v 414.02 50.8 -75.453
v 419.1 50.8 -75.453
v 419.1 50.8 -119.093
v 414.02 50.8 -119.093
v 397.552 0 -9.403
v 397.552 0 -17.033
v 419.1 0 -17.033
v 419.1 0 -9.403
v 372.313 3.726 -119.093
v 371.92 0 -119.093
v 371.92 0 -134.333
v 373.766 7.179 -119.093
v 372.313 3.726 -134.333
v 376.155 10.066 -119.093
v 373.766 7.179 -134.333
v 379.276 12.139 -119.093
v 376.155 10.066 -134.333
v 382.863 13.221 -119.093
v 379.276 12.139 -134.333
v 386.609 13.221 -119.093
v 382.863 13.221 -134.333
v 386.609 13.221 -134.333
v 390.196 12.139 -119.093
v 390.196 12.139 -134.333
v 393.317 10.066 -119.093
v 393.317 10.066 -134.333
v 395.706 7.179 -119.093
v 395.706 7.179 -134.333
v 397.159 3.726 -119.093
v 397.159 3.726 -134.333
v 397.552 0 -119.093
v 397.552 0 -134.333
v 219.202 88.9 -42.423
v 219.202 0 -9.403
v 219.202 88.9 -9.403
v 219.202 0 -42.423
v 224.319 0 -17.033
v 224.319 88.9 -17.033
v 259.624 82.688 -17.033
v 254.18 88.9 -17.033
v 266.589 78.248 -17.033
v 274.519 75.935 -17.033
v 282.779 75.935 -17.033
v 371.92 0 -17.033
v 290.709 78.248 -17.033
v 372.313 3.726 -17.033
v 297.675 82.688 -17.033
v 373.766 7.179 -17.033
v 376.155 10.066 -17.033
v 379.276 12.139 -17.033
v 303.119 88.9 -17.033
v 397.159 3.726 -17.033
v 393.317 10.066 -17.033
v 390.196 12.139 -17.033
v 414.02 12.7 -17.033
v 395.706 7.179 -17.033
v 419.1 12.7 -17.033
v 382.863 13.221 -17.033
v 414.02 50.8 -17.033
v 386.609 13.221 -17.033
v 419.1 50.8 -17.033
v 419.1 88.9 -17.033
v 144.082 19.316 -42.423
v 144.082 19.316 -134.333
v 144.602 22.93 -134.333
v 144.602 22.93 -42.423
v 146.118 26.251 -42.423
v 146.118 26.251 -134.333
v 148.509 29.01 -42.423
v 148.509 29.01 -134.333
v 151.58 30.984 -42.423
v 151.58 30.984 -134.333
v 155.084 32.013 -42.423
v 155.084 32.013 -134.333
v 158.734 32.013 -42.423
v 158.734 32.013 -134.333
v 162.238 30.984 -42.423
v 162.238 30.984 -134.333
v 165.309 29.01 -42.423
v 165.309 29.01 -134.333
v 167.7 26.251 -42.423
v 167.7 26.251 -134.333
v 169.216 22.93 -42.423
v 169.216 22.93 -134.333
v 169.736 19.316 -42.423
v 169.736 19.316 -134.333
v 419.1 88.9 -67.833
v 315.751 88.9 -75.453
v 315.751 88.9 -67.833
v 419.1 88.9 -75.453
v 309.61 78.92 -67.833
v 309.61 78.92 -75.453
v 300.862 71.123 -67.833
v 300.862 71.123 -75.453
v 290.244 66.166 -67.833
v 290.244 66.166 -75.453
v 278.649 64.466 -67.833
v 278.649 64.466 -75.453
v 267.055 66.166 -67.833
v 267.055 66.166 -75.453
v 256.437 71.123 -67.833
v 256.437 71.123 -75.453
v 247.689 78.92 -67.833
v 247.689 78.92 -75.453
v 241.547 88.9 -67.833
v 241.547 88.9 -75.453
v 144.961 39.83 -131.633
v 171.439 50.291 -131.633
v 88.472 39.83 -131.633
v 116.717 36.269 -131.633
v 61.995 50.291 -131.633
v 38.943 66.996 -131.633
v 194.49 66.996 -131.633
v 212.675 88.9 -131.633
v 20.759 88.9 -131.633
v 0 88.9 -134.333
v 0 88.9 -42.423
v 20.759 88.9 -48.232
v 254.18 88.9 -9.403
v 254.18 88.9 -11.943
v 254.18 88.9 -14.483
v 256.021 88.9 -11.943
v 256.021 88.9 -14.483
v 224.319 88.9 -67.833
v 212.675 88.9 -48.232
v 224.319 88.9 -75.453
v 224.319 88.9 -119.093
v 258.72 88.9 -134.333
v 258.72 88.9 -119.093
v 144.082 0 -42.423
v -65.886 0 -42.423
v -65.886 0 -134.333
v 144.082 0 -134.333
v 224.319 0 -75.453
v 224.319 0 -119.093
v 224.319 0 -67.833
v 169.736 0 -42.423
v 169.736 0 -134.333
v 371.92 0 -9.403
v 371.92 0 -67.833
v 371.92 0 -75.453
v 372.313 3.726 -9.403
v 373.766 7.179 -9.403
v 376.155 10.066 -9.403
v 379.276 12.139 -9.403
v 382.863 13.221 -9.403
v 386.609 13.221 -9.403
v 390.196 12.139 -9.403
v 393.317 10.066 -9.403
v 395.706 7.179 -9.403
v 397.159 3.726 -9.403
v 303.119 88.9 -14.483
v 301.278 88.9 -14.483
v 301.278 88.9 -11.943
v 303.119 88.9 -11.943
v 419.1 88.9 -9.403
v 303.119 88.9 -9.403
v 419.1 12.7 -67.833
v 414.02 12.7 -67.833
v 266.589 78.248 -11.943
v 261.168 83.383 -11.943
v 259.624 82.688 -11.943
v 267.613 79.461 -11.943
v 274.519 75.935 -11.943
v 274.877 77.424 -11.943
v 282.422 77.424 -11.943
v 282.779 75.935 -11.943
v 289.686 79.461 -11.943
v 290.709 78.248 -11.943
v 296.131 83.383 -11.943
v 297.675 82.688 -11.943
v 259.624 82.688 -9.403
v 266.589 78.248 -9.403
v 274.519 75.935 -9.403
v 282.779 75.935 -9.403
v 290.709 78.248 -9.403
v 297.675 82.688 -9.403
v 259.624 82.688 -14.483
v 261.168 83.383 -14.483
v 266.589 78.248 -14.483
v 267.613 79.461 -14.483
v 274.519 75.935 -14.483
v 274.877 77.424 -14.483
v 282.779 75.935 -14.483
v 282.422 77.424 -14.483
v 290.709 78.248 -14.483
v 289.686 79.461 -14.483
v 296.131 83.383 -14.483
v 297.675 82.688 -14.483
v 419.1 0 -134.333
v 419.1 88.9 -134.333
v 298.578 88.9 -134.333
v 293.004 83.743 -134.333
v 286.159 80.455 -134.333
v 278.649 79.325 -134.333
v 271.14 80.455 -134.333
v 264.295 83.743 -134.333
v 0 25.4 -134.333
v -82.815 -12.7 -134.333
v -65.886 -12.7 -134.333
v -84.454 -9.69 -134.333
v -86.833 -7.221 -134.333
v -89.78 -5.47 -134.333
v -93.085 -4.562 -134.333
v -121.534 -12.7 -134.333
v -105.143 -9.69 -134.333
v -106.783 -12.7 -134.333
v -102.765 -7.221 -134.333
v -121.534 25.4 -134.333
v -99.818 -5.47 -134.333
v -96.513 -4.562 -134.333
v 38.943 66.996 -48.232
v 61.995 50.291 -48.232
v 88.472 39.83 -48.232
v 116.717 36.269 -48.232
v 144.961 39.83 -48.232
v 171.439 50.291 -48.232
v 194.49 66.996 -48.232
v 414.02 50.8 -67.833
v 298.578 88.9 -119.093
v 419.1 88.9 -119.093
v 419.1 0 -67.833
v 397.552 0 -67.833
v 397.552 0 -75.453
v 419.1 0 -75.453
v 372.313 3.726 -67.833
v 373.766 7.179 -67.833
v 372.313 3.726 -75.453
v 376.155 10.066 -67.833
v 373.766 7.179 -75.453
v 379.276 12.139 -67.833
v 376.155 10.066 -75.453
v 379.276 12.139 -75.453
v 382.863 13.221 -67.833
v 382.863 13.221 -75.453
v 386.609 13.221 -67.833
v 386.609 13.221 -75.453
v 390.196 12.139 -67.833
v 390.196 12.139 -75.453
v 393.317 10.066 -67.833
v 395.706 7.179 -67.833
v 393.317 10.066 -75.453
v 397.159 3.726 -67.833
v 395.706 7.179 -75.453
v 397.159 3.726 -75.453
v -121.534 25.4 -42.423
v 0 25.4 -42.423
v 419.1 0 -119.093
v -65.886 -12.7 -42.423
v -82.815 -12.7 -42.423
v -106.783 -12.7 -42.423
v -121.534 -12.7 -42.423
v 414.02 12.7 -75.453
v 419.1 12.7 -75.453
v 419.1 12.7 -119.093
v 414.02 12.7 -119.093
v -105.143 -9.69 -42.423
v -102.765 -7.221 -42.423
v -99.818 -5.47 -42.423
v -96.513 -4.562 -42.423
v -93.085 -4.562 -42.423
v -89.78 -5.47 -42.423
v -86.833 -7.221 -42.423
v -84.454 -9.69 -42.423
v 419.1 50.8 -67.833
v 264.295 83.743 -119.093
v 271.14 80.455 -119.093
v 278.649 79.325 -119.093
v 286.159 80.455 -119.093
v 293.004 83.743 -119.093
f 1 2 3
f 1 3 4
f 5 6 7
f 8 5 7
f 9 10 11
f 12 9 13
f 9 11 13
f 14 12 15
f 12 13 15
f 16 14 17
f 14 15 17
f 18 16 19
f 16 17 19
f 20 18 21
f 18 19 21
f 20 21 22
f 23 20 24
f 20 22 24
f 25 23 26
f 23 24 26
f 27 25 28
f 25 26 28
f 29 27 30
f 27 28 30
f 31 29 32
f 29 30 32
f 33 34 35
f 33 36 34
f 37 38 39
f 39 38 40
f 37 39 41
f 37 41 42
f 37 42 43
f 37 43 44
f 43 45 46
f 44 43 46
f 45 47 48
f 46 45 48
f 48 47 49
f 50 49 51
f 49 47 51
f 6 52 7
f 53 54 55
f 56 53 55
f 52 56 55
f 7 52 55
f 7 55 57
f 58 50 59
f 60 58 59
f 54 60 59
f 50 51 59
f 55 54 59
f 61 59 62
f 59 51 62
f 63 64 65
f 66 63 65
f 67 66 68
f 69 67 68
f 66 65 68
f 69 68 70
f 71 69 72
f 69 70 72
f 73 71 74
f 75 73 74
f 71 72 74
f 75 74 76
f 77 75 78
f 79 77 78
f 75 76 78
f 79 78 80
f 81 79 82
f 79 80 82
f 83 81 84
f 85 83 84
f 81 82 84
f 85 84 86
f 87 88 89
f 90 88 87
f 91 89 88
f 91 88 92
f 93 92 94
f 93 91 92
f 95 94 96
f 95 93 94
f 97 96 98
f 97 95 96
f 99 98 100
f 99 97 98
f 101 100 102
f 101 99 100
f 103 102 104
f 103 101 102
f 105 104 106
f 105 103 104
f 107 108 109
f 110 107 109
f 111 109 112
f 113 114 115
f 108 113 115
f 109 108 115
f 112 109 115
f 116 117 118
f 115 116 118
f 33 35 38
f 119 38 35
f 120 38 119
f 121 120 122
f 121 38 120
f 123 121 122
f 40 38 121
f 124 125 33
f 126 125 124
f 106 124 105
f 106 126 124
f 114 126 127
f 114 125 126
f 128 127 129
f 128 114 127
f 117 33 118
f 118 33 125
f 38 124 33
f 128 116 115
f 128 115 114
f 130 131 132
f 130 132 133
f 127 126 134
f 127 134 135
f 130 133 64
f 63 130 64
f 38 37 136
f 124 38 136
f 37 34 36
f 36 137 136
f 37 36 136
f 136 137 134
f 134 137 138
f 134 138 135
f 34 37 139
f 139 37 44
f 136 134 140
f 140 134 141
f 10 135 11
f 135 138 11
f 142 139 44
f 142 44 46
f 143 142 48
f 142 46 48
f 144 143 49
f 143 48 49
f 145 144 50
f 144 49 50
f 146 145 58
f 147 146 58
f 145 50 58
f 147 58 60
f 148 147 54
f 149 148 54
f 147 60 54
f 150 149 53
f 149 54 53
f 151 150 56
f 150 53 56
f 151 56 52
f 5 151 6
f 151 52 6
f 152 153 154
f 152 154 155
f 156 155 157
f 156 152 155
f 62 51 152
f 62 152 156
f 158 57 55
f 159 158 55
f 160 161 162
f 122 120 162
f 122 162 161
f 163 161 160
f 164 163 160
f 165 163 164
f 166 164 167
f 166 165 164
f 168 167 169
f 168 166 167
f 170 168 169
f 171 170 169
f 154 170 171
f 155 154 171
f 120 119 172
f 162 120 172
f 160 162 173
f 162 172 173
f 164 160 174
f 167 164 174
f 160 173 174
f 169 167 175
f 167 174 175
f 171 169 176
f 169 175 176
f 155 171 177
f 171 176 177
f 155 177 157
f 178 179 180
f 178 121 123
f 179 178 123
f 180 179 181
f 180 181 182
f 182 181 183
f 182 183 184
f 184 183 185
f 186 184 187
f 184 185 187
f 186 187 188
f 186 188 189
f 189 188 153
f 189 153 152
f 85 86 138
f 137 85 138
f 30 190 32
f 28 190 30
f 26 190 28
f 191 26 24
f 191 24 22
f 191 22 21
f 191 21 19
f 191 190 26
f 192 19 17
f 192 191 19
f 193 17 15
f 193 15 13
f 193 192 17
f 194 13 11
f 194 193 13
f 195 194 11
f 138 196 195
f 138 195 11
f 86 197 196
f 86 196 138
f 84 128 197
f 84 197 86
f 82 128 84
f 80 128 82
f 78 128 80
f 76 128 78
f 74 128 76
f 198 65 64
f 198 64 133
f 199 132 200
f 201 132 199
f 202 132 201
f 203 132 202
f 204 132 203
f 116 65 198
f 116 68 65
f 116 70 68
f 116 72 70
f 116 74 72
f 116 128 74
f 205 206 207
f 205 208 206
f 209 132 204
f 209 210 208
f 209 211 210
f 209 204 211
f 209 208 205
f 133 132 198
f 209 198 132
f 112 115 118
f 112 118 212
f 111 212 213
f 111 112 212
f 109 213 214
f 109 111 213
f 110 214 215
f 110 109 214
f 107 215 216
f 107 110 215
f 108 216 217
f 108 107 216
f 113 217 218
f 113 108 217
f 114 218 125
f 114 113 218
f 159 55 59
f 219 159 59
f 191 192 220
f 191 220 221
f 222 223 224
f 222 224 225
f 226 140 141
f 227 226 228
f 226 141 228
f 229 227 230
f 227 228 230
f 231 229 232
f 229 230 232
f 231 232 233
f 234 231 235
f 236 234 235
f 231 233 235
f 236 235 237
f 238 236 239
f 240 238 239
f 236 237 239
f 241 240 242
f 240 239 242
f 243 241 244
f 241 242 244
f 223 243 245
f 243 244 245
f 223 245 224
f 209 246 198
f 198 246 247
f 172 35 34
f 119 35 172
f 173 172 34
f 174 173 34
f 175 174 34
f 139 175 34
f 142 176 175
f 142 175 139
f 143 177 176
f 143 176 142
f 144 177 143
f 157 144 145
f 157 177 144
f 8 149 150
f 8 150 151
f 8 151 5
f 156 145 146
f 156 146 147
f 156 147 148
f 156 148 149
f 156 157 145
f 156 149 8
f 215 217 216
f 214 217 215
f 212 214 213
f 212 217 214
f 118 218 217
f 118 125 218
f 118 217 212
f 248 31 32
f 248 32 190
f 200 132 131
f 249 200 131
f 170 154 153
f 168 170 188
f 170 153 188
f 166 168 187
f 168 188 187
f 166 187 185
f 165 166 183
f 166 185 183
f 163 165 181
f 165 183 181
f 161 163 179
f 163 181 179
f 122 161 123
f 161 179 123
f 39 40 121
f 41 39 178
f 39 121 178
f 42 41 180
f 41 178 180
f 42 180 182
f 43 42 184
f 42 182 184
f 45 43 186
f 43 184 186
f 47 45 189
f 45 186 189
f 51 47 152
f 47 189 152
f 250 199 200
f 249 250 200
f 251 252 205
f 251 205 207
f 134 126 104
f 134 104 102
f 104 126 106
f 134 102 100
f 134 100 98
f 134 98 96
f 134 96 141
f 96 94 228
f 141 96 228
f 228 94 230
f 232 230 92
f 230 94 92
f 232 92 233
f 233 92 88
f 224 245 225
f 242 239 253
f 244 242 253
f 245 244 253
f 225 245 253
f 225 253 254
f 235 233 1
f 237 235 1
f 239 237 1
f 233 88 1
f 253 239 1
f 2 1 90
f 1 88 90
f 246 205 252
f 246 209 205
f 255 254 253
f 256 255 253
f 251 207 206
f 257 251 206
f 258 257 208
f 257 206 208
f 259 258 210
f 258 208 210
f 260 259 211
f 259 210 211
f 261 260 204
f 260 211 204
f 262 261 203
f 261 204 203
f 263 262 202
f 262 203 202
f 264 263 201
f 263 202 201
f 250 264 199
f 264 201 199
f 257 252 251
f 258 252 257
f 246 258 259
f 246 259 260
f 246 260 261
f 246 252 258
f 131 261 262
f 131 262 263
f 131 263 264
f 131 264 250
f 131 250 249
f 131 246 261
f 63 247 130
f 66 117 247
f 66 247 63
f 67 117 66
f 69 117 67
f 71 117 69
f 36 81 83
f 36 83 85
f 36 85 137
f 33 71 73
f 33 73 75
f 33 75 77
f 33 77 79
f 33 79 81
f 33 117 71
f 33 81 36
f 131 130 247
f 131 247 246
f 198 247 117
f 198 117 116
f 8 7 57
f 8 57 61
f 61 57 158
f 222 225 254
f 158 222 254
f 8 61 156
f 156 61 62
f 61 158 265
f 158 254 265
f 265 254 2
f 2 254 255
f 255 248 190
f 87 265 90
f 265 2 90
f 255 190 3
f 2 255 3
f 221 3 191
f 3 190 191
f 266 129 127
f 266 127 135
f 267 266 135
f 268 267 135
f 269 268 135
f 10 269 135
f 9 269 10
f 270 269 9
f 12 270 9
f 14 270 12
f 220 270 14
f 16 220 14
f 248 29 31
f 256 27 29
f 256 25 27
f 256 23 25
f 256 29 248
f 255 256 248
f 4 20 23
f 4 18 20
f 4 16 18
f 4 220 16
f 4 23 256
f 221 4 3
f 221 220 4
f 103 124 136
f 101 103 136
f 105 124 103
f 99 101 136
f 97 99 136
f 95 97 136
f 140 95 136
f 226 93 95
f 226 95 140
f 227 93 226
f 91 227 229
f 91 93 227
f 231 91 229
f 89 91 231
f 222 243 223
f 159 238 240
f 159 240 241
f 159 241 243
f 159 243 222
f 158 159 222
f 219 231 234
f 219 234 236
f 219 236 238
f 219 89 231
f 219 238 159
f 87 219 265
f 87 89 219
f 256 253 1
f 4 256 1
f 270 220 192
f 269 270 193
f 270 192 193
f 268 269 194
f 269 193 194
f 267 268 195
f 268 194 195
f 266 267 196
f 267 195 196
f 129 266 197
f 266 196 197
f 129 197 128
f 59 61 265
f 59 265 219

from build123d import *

# Parameters (mm, degrees)
SKETCH1_W           = 419.1
SKETCH1_H           = 142.18412
BOSS_EXTRUDE1_DEPTH = 88.9
SKETCH2_R           = 119.38
CUT_EXTRUDE1_DEPTH  = 83.4009
SKETCH7_W           = 194.780719179
SKETCH7_H           = 43.63974
SKETCH7_H_2         = 50.8
CUT_EXTRUDE2_DEPTH  = 452.402640644
SKETCH4_R           = 40.386
CUT_EXTRUDE4_DEPTH  = 10
SKETCH18_R          = 25.527
CUT_EXTRUDE11_DEPTH = 23.09114
SKETCH5_R           = 27.686
CUT_EXTRUDE5_DEPTH  = 448.05209497
SKETCH8_W           = 419.1
SKETCH8_H           = 88.9
CUT_EXTRUDE6_DEPTH  = 7.85114
SKETCH9_W           = 419.1
SKETCH9_H           = 88.9
CUT_EXTRUDE7_DEPTH  = 11.94308
SKETCH10_W          = 219.202
SKETCH10_H          = 88.9
CUT_EXTRUDE8_DEPTH  = 30.48
SKETCH12_W          = 121.533574186
SKETCH12_H          = 91.9099
BOSS_EXTRUDE2_DEPTH = 25.4
SKETCH14_W          = 55.647095764
SKETCH14_H          = 91.9099
BOSS_EXTRUDE3_DEPTH = 12.7
CUT_EXTRUDE10_REACH = 447.564
SKETCH17_R          = 12.827
BOSS_EXTRUDE4_REACH = 446.193
SKETCH20_W          = 5.08
SKETCH20_H          = 38.1
SKETCH22_W          = 199.898
SKETCH22_H          = 88.9
BOSS_EXTRUDE5_DEPTH = 2.54
SKETCH24_R          = 29.21
CUT_EXTRUDE12_DEPTH = 2.54
CUT_EXTRUDE13_START = -5.08
SKETCH24_4_R        = 29.21
CUT_EXTRUDE13_DEPTH = 2.55016
SKETCH29_R          = 12.827
CUT_EXTRUDE14_DEPTH = 446.564033133
BOSS_EXTRUDE6_DEPTH = 86.10092


with BuildPart() as part:
    # Sketch1 → Boss-Extrude1 (new body)
    with BuildSketch(Plane(origin=(0, 0, 0), x_dir=(1, 0, 0), z_dir=(0, 1, 0))):
        with Locations((209.55, 71.09206)):
            Rectangle(SKETCH1_W, SKETCH1_H)
    extrude(amount=BOSS_EXTRUDE1_DEPTH)

    # Sketch2 → Cut-Extrude1 (cut)
    with BuildSketch(Plane(origin=(0, 0, -131.63296), x_dir=(-1, 0, 0), z_dir=(0, 0, -1))):
        with Locations((-116.7166499, 150.061217688)):
            Circle(SKETCH2_R)
    extrude(amount=-CUT_EXTRUDE1_DEPTH, mode=Mode.SUBTRACT)

    # Sketch7 → Cut-Extrude2 (cut, through all)
    with BuildSketch(Plane(origin=(0, 88.9, 0), x_dir=(1, 0, 0), z_dir=(0, 1, 0))):
        with Locations((321.709640411, 97.27311)):
            Rectangle(SKETCH7_W, SKETCH7_H)
        with Locations((321.709640411, 42.43324)):
            Rectangle(SKETCH7_W, SKETCH7_H_2)
    extrude(amount=-CUT_EXTRUDE2_DEPTH, mode=Mode.SUBTRACT)

    # Sketch4 → Cut-Extrude4 (cut)
    with BuildSketch(Plane(origin=(0, 0, -67.83324), x_dir=(-1, 0, 0), z_dir=(0, 0, -1))):
        with Locations((-278.649352085, 104.852009966)):
            Circle(SKETCH4_R)
    extrude(amount=CUT_EXTRUDE4_DEPTH, mode=Mode.SUBTRACT)

    # Sketch18 → Cut-Extrude11 (cut)
    with BuildSketch(Plane(origin=(0, 0, -142.18412), x_dir=(-1, 0, 0), z_dir=(0, 0, -1))):
        with Locations((-278.649352085, 104.852009966)):
            Circle(SKETCH18_R)
    extrude(amount=-CUT_EXTRUDE11_DEPTH, mode=Mode.SUBTRACT)

    # Sketch5 → Cut-Extrude5 (cut, through all)
    with BuildSketch(Plane(origin=(0, 0, -14.48308), x_dir=(-1, 0, 0), z_dir=(0, 0, -1))):
        with Locations((-278.649352085, 104.852009966)):
            Circle(SKETCH5_R)
    extrude(amount=-CUT_EXTRUDE5_DEPTH, mode=Mode.SUBTRACT)

    # Sketch8 → Cut-Extrude6 (cut)
    with BuildSketch(Plane(origin=(0, 0, -142.18412), x_dir=(-1, 0, 0), z_dir=(0, 0, -1))):
        with Locations((-209.55, 44.45)):
            Rectangle(SKETCH8_W, SKETCH8_H)
    extrude(amount=-CUT_EXTRUDE6_DEPTH, mode=Mode.SUBTRACT)

    # Sketch9 → Cut-Extrude7 (cut)
    with BuildSketch(Plane.XY):
        with Locations((209.55, 44.45)):
            Rectangle(SKETCH9_W, SKETCH9_H)
    extrude(amount=-CUT_EXTRUDE7_DEPTH, mode=Mode.SUBTRACT)

    # Sketch10 → Cut-Extrude8 (cut)
    with BuildSketch(Plane.XY.offset(-11.94308)):
        with Locations((109.601, 44.45)):
            Rectangle(SKETCH10_W, SKETCH10_H)
    extrude(amount=-CUT_EXTRUDE8_DEPTH, mode=Mode.SUBTRACT)

    # Sketch12 → Boss-Extrude2 (add)
    with BuildSketch(Plane.XZ):
        with Locations((-60.766787093, -88.37803)):
            Rectangle(SKETCH12_W, SKETCH12_H)
    extrude(amount=-BOSS_EXTRUDE2_DEPTH)

    # Sketch14 → Boss-Extrude3 (add)
    with BuildSketch(Plane.XZ):
        with Locations((-93.710026304, -88.37803)):
            Rectangle(SKETCH14_W, SKETCH14_H)
    extrude(amount=BOSS_EXTRUDE3_DEPTH)

    # Cut-Extrude10: up to this face of the body (flat: up to its plane)
    cut_extrude10_end = Plane(part.part.faces().sort_by_distance((320.017892525, 43.601141034, -11.94308))[0])
    # Sketch17 → Cut-Extrude10 (cut, up to the picked face)
    with BuildSketch(Plane(origin=(0, 0, -134.33298), x_dir=(-1, 0, 0), z_dir=(0, 0, -1)), mode=Mode.PRIVATE) as cut_extrude10_sk1:
        with Locations((-384.735935495, 0.531880938)):
            Circle(SKETCH17_R)
    cut_extrude10_tool1 = split(extrude(cut_extrude10_sk1.sketch, amount=-CUT_EXTRUDE10_REACH, mode=Mode.PRIVATE), bisect_by=cut_extrude10_end, keep=Keep.BOTH, mode=Mode.PRIVATE)
    # Sketch17 → Cut-Extrude10 (cut, up to the picked face)
    with BuildSketch(Plane(origin=(0, 0, -134.33298), x_dir=(-1, 0, 0), z_dir=(0, 0, -1)), mode=Mode.PRIVATE) as cut_extrude10_sk2:
        with Locations((94.798916194, -17.274045482)):
            Circle(SKETCH17_R)
    cut_extrude10_tool2 = split(extrude(cut_extrude10_sk2.sketch, amount=-CUT_EXTRUDE10_REACH, mode=Mode.PRIVATE), bisect_by=cut_extrude10_end, keep=Keep.BOTH, mode=Mode.PRIVATE)
    # Sketch17 → Cut-Extrude10 (cut, up to the picked face)
    with BuildSketch(Plane(origin=(0, 0, -134.33298), x_dir=(-1, 0, 0), z_dir=(0, 0, -1)), mode=Mode.PRIVATE) as cut_extrude10_sk3:
        with BuildLine():
            Line((-169.736021607, 19.31637742), (-169.736021607, 0))
            Line((-169.736021607, 0), (-144.082021607, 0))
            Line((-144.082021607, 0), (-144.082021607, 19.31637742))
            ThreePointArc((-144.082021607, 19.31637742), (-156.909021607, 32.14337742), (-169.736021607, 19.31637742))
        make_face()
    cut_extrude10_tool3 = split(extrude(cut_extrude10_sk3.sketch, amount=-CUT_EXTRUDE10_REACH, mode=Mode.PRIVATE), bisect_by=cut_extrude10_end, keep=Keep.BOTH, mode=Mode.PRIVATE)
    add(cut_extrude10_tool1.solids().sort_by(Axis((384.735935, 0.531881, -134.33298), (0, 0, 1)))[0], mode=Mode.SUBTRACT)
    add(cut_extrude10_tool2.solids().sort_by(Axis((-94.798916, -17.274045, -134.33298), (0, 0, 1)))[0], mode=Mode.SUBTRACT)
    add(cut_extrude10_tool3.solids().sort_by(Axis((156.909022, 14.834778, -134.33298), (0, 0, 1)))[0], mode=Mode.SUBTRACT)

    # Boss-Extrude4: up to this face of the body (flat: up to its plane)
    boss_extrude4_end = Plane(part.part.faces().sort_by_distance((183.515144796, 41.822372775, -134.33298))[0])
    # Sketch20 → Boss-Extrude4 (add, up to the picked face)
    with BuildSketch(Plane(origin=(0, 0, -17.03324), x_dir=(-1, 0, 0), z_dir=(0, 0, -1)), mode=Mode.PRIVATE) as boss_extrude4_sk1:
        with Locations((-416.56, 31.75)):
            Rectangle(SKETCH20_W, SKETCH20_H)
    boss_extrude4_tool1 = split(extrude(boss_extrude4_sk1.sketch, amount=BOSS_EXTRUDE4_REACH, mode=Mode.PRIVATE), bisect_by=boss_extrude4_end, keep=Keep.BOTH, mode=Mode.PRIVATE)
    add(boss_extrude4_tool1.solids().sort_by(Axis((416.56, 31.75, -17.03324), (0, 0, -1)))[0])

    # Sketch22 → Boss-Extrude5 (add)
    with BuildSketch(Plane.XY.offset(-11.94308)):
        with Locations((319.151, 44.45)):
            Rectangle(SKETCH22_W, SKETCH22_H)
    extrude(amount=BOSS_EXTRUDE5_DEPTH)

    # Sketch24 → Cut-Extrude12 (cut)
    with BuildSketch(Plane.XY.offset(-9.40308)):
        with Locations((278.649352085, 104.852009966)):
            Circle(SKETCH24_R)
    extrude(amount=-CUT_EXTRUDE12_DEPTH, mode=Mode.SUBTRACT)

    # Sketch24<4> → Cut-Extrude13 (cut)
    with BuildSketch(Plane.XY.offset(-9.40308).offset(CUT_EXTRUDE13_START)):
        with Locations((278.649352085, 104.852009966)):
            Circle(SKETCH24_4_R)
    extrude(amount=-CUT_EXTRUDE13_DEPTH, mode=Mode.SUBTRACT)

    # Sketch29 → Cut-Extrude14 (cut, through all)
    with BuildSketch(Plane(origin=(0, 0, -11.94308), x_dir=(-1, 0, 0), z_dir=(0, 0, -1))):
        with Locations((-384.735935495, 0.531880938)):
            Circle(SKETCH29_R)
    extrude(amount=-CUT_EXTRUDE14_DEPTH, mode=Mode.SUBTRACT)

    # Sketch30 → Boss-Extrude6 (add)
    with BuildSketch(Plane(origin=(0, 0, -134.33298), x_dir=(-1, 0, 0), z_dir=(0, 0, -1))):
        with BuildLine():
            Line((-14.194018979, 88.9), (-20.758717893, 88.9))
            ThreePointArc((-20.758717893, 88.9), (-116.7166499, 36.269217688), (-212.674581906, 88.9))
            Line((-212.674581906, 88.9), (-219.239280821, 88.9))
            ThreePointArc((-219.239280821, 88.9), (-116.7166499, 30.681217688), (-14.194018979, 88.9))
        make_face()
    extrude(amount=-BOSS_EXTRUDE6_DEPTH)


solid = part.part
